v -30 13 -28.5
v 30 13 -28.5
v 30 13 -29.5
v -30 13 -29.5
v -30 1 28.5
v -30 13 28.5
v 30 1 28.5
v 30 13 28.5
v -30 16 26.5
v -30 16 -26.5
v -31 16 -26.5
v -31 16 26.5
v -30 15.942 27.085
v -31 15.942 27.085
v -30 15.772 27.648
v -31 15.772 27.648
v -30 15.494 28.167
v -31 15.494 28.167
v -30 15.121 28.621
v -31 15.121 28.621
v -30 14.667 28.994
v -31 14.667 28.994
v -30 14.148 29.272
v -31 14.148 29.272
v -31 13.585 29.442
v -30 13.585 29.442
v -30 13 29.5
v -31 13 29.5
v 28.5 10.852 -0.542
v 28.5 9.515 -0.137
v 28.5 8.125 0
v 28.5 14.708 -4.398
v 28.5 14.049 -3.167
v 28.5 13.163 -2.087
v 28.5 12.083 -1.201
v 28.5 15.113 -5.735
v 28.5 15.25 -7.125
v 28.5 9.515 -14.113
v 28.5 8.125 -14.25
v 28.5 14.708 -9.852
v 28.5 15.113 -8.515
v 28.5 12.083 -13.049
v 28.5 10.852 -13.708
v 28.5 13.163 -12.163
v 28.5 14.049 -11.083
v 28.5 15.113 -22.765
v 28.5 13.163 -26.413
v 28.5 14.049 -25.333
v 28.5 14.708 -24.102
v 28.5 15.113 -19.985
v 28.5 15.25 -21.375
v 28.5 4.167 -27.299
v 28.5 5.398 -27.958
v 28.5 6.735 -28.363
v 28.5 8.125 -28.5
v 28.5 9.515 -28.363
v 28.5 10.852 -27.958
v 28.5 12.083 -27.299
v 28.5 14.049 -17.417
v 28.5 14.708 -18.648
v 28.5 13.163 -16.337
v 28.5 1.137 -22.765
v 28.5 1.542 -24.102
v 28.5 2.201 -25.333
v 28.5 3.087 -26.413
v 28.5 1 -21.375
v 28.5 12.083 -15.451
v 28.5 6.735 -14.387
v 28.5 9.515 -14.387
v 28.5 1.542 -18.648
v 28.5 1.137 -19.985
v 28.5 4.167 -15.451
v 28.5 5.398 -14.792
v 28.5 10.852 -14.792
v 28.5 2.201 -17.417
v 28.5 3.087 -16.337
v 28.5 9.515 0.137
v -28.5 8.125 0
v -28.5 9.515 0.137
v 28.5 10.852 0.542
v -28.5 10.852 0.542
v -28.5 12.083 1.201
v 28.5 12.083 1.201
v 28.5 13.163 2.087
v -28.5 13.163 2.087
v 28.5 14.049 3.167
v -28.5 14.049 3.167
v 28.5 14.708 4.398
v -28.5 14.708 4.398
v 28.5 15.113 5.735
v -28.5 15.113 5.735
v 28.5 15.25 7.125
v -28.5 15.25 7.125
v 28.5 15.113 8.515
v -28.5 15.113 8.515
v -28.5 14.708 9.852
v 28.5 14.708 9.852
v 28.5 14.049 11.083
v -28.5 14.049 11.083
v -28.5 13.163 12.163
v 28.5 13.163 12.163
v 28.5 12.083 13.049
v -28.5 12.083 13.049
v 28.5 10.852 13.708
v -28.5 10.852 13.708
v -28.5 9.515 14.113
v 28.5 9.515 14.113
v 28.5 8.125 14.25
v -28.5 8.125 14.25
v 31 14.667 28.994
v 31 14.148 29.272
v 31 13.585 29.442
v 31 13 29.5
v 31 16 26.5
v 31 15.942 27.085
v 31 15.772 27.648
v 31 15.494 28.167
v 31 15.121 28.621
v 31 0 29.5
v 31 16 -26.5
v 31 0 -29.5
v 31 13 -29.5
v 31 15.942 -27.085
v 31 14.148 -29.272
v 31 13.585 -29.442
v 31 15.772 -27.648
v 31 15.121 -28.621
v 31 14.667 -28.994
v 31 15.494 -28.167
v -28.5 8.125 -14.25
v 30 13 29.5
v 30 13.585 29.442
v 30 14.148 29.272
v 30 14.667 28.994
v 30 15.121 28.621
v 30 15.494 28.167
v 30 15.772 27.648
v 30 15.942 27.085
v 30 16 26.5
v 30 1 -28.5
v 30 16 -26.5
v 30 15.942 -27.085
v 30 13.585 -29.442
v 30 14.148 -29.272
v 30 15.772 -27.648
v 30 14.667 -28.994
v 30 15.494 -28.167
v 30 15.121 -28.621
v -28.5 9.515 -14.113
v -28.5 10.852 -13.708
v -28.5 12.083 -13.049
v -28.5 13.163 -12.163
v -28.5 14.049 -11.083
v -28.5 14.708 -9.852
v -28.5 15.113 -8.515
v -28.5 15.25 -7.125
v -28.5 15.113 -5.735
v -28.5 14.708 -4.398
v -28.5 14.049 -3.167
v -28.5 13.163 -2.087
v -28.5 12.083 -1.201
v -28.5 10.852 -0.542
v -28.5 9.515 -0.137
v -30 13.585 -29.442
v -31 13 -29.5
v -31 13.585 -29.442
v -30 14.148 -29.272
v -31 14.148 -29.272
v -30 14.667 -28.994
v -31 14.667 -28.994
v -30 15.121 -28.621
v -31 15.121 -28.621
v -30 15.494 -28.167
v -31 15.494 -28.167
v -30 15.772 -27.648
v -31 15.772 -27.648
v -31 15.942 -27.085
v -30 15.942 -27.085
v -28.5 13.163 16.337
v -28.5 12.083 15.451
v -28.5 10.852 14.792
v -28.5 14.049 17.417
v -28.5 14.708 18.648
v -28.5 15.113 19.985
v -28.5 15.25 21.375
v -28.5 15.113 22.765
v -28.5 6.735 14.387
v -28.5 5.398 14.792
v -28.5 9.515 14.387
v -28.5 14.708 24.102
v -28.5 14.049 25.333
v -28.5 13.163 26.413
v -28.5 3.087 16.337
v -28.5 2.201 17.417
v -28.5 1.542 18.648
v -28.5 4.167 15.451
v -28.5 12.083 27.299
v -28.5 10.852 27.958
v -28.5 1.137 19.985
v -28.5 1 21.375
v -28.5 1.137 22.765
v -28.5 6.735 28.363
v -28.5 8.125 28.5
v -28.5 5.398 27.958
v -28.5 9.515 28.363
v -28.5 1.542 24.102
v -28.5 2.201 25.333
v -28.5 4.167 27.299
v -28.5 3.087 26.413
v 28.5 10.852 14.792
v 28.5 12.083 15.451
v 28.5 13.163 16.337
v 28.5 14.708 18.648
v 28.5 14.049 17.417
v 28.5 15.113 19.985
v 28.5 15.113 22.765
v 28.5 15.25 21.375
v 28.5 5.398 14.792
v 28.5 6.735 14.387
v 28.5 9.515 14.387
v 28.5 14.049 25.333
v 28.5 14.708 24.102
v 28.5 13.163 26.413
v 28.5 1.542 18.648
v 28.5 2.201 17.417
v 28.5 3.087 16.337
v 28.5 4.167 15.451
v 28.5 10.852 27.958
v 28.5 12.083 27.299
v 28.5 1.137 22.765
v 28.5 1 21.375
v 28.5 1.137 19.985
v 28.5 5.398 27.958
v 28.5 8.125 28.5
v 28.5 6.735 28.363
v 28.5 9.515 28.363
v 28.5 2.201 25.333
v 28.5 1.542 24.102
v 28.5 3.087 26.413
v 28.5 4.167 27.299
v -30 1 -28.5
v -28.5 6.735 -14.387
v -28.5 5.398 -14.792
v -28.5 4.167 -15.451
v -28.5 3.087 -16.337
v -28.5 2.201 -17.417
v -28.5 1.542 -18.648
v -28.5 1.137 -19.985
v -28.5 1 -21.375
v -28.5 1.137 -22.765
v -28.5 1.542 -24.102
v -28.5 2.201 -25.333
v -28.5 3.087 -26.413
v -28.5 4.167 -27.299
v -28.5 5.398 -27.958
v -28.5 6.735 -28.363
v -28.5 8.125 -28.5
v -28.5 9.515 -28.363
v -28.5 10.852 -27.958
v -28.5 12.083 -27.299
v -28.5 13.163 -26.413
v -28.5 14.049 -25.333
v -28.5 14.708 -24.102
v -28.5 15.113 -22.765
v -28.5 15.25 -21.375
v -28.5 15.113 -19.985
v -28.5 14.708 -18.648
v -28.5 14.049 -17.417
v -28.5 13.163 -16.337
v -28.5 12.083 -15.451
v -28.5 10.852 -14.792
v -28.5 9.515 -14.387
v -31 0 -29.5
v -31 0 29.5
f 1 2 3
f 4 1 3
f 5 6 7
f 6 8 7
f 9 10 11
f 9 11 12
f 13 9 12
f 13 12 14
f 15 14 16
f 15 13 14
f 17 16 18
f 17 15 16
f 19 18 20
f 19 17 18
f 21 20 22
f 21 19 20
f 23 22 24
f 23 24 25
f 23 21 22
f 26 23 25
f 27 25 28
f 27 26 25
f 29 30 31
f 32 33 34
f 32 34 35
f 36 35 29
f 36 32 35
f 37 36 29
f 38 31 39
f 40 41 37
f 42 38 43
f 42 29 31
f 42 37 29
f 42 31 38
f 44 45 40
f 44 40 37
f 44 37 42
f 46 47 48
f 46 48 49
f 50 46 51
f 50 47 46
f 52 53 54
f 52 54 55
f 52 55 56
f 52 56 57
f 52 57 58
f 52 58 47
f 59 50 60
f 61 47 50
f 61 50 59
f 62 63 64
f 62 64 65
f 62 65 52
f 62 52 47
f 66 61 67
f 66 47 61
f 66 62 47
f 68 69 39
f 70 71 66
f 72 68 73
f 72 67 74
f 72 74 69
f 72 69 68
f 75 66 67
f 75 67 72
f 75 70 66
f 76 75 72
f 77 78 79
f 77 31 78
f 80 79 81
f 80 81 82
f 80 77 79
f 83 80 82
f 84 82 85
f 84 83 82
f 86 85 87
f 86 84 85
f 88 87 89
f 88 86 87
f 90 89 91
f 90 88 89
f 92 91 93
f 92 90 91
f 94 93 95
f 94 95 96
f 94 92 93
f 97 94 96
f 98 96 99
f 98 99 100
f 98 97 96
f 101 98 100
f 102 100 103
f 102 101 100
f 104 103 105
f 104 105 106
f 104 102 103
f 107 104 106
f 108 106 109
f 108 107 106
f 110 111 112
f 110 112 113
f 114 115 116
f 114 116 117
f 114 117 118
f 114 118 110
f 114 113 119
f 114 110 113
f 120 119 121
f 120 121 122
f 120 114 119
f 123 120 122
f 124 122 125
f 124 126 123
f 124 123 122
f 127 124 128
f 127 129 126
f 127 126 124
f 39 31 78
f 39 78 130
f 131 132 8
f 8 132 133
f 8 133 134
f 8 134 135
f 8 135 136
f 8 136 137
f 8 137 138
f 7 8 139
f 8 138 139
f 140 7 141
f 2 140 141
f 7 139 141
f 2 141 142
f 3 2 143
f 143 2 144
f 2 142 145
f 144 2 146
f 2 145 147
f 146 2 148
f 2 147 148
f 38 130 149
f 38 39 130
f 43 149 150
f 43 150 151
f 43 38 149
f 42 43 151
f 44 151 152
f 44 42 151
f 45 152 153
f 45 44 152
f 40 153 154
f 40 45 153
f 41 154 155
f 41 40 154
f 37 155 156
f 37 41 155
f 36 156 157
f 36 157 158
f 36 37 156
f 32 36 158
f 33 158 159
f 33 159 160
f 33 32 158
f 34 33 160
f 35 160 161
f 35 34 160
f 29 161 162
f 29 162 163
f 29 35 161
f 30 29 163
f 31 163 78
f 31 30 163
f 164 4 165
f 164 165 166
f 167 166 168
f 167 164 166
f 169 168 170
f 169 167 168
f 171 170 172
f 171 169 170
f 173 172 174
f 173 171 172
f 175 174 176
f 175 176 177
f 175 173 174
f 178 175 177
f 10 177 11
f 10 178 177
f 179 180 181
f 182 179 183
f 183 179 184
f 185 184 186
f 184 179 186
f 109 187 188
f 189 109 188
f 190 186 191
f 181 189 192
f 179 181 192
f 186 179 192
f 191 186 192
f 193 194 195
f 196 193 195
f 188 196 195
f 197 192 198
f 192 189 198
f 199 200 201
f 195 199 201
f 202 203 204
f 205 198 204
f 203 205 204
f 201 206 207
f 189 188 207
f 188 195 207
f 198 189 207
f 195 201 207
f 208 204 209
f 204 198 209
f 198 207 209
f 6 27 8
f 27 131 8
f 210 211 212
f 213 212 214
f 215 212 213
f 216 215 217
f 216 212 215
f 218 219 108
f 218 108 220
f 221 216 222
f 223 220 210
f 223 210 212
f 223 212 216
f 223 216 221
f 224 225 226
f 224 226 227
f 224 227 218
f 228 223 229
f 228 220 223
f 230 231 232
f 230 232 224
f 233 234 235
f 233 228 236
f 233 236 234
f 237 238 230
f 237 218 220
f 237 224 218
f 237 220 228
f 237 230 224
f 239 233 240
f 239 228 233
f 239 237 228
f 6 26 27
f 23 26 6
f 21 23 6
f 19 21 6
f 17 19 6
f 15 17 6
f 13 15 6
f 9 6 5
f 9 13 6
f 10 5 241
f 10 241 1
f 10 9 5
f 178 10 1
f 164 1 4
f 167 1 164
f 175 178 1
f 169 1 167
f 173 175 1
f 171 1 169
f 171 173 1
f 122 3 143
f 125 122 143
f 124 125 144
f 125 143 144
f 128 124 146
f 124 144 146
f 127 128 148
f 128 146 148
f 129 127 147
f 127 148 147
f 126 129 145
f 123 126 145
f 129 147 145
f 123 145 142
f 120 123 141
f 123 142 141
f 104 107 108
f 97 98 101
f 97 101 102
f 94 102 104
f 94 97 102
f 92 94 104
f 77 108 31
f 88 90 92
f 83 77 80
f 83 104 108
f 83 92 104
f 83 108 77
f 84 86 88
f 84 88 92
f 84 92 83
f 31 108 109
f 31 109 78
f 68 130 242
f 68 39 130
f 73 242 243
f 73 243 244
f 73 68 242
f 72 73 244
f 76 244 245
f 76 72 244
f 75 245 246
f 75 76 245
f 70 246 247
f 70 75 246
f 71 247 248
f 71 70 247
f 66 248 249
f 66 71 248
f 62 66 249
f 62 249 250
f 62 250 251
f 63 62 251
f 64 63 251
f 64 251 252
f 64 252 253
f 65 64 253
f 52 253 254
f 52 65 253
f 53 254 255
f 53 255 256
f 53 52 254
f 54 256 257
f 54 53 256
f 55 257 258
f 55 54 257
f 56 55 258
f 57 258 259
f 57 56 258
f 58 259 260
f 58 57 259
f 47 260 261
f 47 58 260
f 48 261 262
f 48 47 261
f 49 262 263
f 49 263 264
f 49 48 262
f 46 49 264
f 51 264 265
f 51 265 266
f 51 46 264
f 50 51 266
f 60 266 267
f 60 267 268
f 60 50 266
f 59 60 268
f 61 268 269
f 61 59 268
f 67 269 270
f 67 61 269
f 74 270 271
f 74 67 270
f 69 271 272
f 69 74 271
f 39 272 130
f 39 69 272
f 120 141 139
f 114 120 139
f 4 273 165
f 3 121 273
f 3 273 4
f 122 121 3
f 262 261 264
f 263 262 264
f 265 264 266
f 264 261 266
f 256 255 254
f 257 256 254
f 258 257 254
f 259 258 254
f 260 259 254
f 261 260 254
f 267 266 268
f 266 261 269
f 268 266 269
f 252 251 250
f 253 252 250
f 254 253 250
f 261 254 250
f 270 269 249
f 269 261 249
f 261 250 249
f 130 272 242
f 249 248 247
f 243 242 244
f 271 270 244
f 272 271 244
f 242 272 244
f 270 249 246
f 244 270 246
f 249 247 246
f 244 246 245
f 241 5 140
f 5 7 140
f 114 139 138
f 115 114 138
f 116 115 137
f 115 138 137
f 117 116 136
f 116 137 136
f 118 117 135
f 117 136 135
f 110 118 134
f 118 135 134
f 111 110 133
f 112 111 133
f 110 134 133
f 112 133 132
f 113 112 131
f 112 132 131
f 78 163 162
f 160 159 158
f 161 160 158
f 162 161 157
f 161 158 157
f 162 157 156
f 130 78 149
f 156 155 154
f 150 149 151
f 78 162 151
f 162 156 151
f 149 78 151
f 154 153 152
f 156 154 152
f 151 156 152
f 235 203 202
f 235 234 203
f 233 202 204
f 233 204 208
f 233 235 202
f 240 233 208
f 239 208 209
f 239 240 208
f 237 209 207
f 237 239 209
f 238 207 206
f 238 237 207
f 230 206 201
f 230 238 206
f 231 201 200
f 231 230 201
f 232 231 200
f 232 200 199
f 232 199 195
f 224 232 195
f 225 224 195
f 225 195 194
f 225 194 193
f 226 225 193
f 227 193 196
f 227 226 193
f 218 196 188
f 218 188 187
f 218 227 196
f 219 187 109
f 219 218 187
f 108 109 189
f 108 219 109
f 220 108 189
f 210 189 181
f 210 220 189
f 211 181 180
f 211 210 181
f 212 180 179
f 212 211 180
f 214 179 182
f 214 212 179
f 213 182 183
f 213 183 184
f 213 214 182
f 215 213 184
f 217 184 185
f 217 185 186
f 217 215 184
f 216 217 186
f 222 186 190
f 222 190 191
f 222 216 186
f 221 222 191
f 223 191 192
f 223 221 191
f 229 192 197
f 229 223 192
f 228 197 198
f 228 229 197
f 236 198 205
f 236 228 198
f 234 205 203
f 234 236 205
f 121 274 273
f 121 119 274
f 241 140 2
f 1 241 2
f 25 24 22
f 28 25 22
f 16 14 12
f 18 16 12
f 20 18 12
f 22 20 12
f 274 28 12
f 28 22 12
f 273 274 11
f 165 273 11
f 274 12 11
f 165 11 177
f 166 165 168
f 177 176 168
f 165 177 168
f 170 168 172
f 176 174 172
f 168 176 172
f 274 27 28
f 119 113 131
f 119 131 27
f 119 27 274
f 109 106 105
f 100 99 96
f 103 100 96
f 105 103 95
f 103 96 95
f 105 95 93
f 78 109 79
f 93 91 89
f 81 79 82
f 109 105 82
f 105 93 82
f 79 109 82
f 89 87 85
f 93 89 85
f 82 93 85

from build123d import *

# Parameters (mm, degrees)
LINEAR_AUSTRAGEN1_DEPTH   = 30
LINEAR_AUSTRAGEN2_DEPTH   = 1
LINEAR_AUSTRAGEN3_DEPTH   = 28.5
SKIZZE3_R                 = 7.125
LINEAR_AUSTRAGEN3_2_DEPTH = 28.5
LINEAR_AUSTRAGEN3_3_DEPTH = 28.5
LINEAR_AUSTRAGEN3_4_DEPTH = 28.5


with BuildPart() as part:
    # Skizze1 → Linear austragen1 (new body)
    with BuildSketch(Plane(origin=(0, 0, 0), x_dir=(0, 0, -1), z_dir=(1, 0, 0))):
        Polygon((29.5, 13), (29.5, 0), (-29.5, 0), (-29.5, 13), (-28.5, 13), (-28.5, 1), (28.5, 1), (28.5, 13), align=None)
    linear_austragen1 = extrude(amount=LINEAR_AUSTRAGEN1_DEPTH)

    # Skizze2 → Linear austragen2 (add)
    with BuildSketch(Plane(origin=(30, 0, 0), x_dir=(0, 0, -1), z_dir=(1, 0, 0))):
        with BuildLine():
            Line((-29.5, 0), (29.5, 0))
            Line((29.5, 0), (29.5, 13))
            ThreePointArc((29.5, 13), (28.621320344, 15.121320344), (26.5, 16))
            Line((26.5, 16), (-26.5, 16))
            ThreePointArc((-26.5, 16), (-28.621320344, 15.121320344), (-29.5, 13))
            Line((-29.5, 13), (-29.5, 0))
        make_face()
    linear_austragen2 = extrude(amount=LINEAR_AUSTRAGEN2_DEPTH)

    # Spiegeln11: Linear austragen1, Linear austragen2 across plane
    add(linear_austragen1.mirror(Plane(origin=(0, 13, -29.5), x_dir=(0, 0, 1), z_dir=(-1, 0, 0))))
    add(linear_austragen2.mirror(Plane(origin=(0, 13, -29.5), x_dir=(0, 0, 1), z_dir=(-1, 0, 0))))


with BuildPart() as body_2:
    # Skizze3 → Linear austragen3 (new, symmetric)
    with BuildSketch(Plane(origin=(0, 0, 0), x_dir=(0, 0, -1), z_dir=(1, 0, 0))):
        with BuildLine():
            ThreePointArc((0, 8.125), (-7.125, 15.25), (-14.25, 8.125))
            Line((-14.25, 8.125), (0, 8.125))
        make_face()
    extrude(amount=LINEAR_AUSTRAGEN3_DEPTH, both=True)


with BuildPart() as body_3:
    # Skizze3 → Linear austragen3 2 (new, symmetric)
    with BuildSketch(Plane(origin=(0, 0, 0), x_dir=(0, 0, -1), z_dir=(1, 0, 0))):
        with Locations(Location((-21.375, 8.125, 0), (0, 0, 180))):
            Circle(SKIZZE3_R)
    extrude(amount=LINEAR_AUSTRAGEN3_2_DEPTH, both=True)


with BuildPart() as body_4:
    # Skizze3 → Linear austragen3 3 (new, symmetric)
    with BuildSketch(Plane(origin=(0, 0, 0), x_dir=(0, 0, -1), z_dir=(1, 0, 0))):
        with Locations(Location((21.375, 8.125, 0), (0, 0, 180))):
            Circle(SKIZZE3_R)
    extrude(amount=LINEAR_AUSTRAGEN3_3_DEPTH, both=True)


with BuildPart() as body_5:
    # Skizze3 → Linear austragen3 4 (new, symmetric)
    with BuildSketch(Plane(origin=(0, 0, 0), x_dir=(0, 0, -1), z_dir=(1, 0, 0))):
        with BuildLine():
            ThreePointArc((14.25, 8.125), (7.125, 15.25), (0, 8.125))
            Line((0, 8.125), (14.25, 8.125))
        make_face()
    extrude(amount=LINEAR_AUSTRAGEN3_4_DEPTH, both=True)


solid = Compound([part.part, body_2.part, body_3.part, body_4.part, body_5.part])
